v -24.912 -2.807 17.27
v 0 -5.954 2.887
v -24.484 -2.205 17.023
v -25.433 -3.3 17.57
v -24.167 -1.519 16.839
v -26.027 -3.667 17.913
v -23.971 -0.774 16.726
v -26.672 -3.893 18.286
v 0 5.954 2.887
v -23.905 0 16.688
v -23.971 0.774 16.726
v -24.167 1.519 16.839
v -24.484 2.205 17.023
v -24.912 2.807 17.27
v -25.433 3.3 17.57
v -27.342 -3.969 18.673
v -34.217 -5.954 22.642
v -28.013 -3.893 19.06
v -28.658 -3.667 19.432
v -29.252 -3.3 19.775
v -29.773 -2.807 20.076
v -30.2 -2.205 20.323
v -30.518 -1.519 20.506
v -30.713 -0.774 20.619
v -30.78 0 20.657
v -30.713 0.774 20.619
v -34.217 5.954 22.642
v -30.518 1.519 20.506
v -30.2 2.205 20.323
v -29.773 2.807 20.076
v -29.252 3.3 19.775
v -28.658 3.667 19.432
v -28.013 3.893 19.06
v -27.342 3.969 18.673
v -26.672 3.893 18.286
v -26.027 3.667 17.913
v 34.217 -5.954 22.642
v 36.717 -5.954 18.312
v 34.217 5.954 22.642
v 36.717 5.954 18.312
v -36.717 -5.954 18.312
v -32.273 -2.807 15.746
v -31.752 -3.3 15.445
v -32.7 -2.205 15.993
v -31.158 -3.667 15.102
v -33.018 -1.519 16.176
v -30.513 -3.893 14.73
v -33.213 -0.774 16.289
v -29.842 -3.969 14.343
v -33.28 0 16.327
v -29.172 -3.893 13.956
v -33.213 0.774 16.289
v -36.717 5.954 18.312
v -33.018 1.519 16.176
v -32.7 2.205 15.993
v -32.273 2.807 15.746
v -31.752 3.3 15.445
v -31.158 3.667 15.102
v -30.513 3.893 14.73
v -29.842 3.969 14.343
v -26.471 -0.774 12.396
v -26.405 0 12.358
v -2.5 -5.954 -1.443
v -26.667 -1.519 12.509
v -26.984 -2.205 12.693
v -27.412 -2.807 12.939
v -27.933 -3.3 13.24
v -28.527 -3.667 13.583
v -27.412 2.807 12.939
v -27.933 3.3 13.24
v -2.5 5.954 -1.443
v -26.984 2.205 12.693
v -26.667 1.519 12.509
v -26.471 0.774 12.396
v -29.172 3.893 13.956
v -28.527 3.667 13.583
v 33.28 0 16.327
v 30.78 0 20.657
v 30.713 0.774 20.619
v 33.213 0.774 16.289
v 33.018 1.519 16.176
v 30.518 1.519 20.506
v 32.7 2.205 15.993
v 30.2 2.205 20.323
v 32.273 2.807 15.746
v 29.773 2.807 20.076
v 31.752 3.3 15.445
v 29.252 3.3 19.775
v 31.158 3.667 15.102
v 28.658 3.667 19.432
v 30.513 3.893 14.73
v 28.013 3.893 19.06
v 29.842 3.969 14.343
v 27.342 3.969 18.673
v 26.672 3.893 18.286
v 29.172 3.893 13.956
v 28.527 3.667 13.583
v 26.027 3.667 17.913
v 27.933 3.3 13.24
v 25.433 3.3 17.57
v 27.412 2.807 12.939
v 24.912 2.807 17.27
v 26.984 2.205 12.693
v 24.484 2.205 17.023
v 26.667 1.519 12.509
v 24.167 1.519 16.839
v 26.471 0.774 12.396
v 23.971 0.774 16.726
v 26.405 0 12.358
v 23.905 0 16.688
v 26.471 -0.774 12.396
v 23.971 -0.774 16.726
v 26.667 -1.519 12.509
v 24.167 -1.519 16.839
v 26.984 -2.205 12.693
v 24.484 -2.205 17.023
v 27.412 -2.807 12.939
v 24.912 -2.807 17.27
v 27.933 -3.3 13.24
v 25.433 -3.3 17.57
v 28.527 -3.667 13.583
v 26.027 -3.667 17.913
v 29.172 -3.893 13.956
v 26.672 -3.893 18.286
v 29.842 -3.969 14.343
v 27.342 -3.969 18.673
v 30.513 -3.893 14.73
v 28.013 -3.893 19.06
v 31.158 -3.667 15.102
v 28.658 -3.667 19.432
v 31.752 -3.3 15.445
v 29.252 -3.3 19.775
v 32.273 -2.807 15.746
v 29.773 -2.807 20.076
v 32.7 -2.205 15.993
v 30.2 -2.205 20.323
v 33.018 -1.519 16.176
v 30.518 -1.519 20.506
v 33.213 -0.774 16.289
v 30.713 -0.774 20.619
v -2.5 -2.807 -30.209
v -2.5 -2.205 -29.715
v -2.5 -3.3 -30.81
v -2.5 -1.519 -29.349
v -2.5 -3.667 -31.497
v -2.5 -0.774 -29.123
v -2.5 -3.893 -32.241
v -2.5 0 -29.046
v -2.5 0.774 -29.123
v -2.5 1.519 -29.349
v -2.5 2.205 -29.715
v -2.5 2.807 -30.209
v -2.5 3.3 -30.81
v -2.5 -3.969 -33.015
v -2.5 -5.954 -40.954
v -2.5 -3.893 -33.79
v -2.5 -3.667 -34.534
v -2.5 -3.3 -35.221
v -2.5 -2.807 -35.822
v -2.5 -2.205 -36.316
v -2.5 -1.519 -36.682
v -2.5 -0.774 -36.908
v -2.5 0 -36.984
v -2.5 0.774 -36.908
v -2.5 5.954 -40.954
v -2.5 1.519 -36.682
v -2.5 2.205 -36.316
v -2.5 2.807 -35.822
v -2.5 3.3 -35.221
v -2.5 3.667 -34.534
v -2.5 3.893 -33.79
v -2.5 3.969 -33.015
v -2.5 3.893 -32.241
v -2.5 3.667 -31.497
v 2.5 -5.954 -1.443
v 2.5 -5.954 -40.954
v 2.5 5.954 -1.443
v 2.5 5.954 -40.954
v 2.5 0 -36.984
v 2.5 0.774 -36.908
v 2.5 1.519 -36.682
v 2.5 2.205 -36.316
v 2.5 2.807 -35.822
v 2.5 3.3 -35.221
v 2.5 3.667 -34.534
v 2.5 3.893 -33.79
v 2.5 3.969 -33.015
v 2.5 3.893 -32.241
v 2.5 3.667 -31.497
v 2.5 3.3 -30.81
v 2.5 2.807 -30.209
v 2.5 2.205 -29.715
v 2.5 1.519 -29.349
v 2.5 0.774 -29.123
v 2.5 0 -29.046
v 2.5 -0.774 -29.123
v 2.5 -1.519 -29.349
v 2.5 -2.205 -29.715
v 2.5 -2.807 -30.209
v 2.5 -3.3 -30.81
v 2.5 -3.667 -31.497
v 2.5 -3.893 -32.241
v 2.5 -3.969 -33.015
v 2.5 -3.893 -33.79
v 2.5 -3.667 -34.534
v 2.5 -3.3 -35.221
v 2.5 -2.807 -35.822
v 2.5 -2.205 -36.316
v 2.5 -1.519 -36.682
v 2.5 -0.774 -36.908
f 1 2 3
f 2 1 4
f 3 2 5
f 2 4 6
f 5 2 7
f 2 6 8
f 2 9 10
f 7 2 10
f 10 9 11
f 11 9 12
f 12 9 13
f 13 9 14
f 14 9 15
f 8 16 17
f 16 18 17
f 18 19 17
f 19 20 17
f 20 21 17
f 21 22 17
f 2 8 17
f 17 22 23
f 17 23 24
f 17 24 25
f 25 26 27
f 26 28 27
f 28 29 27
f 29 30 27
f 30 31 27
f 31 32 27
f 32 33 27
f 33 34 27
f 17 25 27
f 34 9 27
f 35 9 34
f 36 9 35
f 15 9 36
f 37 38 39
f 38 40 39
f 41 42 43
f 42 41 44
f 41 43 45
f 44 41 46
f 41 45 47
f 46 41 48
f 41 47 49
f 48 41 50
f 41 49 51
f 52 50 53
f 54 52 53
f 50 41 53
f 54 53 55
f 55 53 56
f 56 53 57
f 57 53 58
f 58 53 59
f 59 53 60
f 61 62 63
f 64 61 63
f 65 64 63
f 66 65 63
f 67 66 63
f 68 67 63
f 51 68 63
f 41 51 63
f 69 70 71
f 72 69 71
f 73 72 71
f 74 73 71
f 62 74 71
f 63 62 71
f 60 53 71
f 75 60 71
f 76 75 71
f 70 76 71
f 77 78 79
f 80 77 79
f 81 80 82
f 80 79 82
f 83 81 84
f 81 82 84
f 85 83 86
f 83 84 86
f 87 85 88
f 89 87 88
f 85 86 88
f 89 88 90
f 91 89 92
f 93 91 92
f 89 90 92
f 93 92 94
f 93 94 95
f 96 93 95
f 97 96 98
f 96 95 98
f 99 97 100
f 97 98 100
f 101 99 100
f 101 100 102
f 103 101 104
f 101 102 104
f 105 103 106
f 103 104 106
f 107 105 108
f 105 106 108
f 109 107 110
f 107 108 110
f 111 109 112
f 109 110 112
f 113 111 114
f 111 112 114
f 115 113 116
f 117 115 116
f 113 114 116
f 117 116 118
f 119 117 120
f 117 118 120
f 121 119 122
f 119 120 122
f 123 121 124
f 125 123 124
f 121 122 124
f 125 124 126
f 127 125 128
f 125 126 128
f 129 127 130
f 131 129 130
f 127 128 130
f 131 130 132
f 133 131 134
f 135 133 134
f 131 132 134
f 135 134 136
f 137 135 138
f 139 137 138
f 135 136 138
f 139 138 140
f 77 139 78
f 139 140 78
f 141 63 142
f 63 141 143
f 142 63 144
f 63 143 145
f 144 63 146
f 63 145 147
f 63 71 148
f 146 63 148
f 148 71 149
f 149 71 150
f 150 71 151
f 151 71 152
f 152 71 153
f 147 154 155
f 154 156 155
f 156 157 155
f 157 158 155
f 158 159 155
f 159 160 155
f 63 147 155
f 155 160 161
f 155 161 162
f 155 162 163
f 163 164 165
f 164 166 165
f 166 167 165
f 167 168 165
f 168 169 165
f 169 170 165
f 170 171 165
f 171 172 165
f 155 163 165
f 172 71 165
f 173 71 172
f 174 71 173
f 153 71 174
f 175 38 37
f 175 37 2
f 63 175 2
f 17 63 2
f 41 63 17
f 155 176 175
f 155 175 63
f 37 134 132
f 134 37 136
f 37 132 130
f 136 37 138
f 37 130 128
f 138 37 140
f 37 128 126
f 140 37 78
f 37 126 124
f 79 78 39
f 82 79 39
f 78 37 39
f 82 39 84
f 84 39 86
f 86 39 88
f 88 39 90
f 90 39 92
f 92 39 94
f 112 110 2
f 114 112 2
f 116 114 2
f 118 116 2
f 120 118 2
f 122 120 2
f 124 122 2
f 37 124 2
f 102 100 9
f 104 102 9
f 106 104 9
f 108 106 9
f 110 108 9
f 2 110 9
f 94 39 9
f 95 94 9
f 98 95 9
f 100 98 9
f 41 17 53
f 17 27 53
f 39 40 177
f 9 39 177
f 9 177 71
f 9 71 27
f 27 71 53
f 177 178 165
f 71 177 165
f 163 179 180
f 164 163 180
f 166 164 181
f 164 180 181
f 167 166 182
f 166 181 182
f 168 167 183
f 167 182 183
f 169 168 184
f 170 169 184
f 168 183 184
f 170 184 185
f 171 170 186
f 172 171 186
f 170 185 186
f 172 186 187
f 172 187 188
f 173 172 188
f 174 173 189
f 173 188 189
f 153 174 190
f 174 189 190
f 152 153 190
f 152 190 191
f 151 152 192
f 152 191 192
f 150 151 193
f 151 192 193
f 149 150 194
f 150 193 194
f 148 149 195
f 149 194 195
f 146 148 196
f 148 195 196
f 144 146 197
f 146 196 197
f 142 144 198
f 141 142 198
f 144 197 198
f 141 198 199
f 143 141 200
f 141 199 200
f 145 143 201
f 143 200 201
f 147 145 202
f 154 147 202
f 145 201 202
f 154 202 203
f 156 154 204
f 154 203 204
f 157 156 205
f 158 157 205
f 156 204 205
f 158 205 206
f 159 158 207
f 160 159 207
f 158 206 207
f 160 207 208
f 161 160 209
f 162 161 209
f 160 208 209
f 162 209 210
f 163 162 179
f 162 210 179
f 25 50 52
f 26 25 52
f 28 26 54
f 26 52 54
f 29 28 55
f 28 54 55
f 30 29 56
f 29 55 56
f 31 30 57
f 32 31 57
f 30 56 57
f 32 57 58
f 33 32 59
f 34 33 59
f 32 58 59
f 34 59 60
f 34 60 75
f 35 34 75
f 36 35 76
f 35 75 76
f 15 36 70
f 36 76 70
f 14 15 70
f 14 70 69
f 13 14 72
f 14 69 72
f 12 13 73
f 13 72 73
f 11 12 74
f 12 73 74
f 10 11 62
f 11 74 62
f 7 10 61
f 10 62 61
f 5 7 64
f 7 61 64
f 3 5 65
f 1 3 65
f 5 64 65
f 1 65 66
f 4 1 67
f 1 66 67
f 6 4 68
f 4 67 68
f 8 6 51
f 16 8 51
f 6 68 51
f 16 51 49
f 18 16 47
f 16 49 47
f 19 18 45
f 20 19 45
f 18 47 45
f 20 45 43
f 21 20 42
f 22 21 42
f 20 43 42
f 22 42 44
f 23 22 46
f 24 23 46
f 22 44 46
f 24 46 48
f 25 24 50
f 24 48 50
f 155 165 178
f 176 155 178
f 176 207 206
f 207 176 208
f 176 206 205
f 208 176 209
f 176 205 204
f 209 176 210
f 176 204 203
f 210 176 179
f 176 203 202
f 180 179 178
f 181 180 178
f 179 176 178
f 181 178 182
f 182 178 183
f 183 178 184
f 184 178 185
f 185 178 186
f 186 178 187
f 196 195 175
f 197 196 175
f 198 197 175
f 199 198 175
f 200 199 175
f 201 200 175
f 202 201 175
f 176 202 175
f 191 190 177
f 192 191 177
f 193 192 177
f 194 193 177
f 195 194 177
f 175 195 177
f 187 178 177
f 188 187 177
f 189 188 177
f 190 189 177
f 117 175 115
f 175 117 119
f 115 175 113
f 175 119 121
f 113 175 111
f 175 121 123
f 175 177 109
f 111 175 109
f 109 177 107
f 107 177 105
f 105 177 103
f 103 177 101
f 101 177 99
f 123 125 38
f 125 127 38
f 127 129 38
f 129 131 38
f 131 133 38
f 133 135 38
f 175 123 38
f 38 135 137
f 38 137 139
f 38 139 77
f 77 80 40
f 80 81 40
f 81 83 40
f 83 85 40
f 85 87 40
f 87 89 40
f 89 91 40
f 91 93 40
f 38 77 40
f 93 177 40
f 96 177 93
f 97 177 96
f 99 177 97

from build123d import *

# Parameters (mm, degrees)
SALIENTE_EXTRUIR1_DEPTH = 5.9535
CROQUIS2_R              = 3.969
CORTAR_EXTRUIR1_DEPTH   = 5
MATRIZC1_COUNT          = 3


with BuildPart() as part:
    # Croquis1 → Saliente-Extruir1 (new body, symmetric)
    with BuildSketch(Plane(origin=(0, 0, 0), x_dir=(1, 0, 0), z_dir=(0, 1, 0))):
        Polygon((-2.5, 40.9535), (2.5, 40.9535), (2.5, 1.443375673), (36.716771374, -18.311686491), (34.216771374, -22.641813509), (0, -2.886751346), (-34.216771374, -22.641813509), (-36.716771374, -18.311686491), (-2.5, 1.443375673), align=None)
    extrude(amount=SALIENTE_EXTRUIR1_DEPTH, both=True)

    # Croquis2 → Cortar-Extruir1 (cut)
    with BuildSketch(Plane(origin=(-1.25, 0, 2.165063509), x_dir=(0.866025404, 0, 0.5), z_dir=(-0.5, 0, 0.866025404))):
        with Locations((33.0155, 0)):
            Circle(CROQUIS2_R)
    cortar_extruir1 = extrude(amount=-CORTAR_EXTRUIR1_DEPTH, mode=Mode.SUBTRACT)

    # MatrizC1: Cortar-Extruir1 ×3 about axis
    matrizc1_axis = Axis((0, 5.9535, 0), (0, 1, 0))
    for i in range(1, MATRIZC1_COUNT):
        add(cortar_extruir1.rotate(matrizc1_axis, i * 360 / MATRIZC1_COUNT), mode=Mode.SUBTRACT)


solid = part.part
